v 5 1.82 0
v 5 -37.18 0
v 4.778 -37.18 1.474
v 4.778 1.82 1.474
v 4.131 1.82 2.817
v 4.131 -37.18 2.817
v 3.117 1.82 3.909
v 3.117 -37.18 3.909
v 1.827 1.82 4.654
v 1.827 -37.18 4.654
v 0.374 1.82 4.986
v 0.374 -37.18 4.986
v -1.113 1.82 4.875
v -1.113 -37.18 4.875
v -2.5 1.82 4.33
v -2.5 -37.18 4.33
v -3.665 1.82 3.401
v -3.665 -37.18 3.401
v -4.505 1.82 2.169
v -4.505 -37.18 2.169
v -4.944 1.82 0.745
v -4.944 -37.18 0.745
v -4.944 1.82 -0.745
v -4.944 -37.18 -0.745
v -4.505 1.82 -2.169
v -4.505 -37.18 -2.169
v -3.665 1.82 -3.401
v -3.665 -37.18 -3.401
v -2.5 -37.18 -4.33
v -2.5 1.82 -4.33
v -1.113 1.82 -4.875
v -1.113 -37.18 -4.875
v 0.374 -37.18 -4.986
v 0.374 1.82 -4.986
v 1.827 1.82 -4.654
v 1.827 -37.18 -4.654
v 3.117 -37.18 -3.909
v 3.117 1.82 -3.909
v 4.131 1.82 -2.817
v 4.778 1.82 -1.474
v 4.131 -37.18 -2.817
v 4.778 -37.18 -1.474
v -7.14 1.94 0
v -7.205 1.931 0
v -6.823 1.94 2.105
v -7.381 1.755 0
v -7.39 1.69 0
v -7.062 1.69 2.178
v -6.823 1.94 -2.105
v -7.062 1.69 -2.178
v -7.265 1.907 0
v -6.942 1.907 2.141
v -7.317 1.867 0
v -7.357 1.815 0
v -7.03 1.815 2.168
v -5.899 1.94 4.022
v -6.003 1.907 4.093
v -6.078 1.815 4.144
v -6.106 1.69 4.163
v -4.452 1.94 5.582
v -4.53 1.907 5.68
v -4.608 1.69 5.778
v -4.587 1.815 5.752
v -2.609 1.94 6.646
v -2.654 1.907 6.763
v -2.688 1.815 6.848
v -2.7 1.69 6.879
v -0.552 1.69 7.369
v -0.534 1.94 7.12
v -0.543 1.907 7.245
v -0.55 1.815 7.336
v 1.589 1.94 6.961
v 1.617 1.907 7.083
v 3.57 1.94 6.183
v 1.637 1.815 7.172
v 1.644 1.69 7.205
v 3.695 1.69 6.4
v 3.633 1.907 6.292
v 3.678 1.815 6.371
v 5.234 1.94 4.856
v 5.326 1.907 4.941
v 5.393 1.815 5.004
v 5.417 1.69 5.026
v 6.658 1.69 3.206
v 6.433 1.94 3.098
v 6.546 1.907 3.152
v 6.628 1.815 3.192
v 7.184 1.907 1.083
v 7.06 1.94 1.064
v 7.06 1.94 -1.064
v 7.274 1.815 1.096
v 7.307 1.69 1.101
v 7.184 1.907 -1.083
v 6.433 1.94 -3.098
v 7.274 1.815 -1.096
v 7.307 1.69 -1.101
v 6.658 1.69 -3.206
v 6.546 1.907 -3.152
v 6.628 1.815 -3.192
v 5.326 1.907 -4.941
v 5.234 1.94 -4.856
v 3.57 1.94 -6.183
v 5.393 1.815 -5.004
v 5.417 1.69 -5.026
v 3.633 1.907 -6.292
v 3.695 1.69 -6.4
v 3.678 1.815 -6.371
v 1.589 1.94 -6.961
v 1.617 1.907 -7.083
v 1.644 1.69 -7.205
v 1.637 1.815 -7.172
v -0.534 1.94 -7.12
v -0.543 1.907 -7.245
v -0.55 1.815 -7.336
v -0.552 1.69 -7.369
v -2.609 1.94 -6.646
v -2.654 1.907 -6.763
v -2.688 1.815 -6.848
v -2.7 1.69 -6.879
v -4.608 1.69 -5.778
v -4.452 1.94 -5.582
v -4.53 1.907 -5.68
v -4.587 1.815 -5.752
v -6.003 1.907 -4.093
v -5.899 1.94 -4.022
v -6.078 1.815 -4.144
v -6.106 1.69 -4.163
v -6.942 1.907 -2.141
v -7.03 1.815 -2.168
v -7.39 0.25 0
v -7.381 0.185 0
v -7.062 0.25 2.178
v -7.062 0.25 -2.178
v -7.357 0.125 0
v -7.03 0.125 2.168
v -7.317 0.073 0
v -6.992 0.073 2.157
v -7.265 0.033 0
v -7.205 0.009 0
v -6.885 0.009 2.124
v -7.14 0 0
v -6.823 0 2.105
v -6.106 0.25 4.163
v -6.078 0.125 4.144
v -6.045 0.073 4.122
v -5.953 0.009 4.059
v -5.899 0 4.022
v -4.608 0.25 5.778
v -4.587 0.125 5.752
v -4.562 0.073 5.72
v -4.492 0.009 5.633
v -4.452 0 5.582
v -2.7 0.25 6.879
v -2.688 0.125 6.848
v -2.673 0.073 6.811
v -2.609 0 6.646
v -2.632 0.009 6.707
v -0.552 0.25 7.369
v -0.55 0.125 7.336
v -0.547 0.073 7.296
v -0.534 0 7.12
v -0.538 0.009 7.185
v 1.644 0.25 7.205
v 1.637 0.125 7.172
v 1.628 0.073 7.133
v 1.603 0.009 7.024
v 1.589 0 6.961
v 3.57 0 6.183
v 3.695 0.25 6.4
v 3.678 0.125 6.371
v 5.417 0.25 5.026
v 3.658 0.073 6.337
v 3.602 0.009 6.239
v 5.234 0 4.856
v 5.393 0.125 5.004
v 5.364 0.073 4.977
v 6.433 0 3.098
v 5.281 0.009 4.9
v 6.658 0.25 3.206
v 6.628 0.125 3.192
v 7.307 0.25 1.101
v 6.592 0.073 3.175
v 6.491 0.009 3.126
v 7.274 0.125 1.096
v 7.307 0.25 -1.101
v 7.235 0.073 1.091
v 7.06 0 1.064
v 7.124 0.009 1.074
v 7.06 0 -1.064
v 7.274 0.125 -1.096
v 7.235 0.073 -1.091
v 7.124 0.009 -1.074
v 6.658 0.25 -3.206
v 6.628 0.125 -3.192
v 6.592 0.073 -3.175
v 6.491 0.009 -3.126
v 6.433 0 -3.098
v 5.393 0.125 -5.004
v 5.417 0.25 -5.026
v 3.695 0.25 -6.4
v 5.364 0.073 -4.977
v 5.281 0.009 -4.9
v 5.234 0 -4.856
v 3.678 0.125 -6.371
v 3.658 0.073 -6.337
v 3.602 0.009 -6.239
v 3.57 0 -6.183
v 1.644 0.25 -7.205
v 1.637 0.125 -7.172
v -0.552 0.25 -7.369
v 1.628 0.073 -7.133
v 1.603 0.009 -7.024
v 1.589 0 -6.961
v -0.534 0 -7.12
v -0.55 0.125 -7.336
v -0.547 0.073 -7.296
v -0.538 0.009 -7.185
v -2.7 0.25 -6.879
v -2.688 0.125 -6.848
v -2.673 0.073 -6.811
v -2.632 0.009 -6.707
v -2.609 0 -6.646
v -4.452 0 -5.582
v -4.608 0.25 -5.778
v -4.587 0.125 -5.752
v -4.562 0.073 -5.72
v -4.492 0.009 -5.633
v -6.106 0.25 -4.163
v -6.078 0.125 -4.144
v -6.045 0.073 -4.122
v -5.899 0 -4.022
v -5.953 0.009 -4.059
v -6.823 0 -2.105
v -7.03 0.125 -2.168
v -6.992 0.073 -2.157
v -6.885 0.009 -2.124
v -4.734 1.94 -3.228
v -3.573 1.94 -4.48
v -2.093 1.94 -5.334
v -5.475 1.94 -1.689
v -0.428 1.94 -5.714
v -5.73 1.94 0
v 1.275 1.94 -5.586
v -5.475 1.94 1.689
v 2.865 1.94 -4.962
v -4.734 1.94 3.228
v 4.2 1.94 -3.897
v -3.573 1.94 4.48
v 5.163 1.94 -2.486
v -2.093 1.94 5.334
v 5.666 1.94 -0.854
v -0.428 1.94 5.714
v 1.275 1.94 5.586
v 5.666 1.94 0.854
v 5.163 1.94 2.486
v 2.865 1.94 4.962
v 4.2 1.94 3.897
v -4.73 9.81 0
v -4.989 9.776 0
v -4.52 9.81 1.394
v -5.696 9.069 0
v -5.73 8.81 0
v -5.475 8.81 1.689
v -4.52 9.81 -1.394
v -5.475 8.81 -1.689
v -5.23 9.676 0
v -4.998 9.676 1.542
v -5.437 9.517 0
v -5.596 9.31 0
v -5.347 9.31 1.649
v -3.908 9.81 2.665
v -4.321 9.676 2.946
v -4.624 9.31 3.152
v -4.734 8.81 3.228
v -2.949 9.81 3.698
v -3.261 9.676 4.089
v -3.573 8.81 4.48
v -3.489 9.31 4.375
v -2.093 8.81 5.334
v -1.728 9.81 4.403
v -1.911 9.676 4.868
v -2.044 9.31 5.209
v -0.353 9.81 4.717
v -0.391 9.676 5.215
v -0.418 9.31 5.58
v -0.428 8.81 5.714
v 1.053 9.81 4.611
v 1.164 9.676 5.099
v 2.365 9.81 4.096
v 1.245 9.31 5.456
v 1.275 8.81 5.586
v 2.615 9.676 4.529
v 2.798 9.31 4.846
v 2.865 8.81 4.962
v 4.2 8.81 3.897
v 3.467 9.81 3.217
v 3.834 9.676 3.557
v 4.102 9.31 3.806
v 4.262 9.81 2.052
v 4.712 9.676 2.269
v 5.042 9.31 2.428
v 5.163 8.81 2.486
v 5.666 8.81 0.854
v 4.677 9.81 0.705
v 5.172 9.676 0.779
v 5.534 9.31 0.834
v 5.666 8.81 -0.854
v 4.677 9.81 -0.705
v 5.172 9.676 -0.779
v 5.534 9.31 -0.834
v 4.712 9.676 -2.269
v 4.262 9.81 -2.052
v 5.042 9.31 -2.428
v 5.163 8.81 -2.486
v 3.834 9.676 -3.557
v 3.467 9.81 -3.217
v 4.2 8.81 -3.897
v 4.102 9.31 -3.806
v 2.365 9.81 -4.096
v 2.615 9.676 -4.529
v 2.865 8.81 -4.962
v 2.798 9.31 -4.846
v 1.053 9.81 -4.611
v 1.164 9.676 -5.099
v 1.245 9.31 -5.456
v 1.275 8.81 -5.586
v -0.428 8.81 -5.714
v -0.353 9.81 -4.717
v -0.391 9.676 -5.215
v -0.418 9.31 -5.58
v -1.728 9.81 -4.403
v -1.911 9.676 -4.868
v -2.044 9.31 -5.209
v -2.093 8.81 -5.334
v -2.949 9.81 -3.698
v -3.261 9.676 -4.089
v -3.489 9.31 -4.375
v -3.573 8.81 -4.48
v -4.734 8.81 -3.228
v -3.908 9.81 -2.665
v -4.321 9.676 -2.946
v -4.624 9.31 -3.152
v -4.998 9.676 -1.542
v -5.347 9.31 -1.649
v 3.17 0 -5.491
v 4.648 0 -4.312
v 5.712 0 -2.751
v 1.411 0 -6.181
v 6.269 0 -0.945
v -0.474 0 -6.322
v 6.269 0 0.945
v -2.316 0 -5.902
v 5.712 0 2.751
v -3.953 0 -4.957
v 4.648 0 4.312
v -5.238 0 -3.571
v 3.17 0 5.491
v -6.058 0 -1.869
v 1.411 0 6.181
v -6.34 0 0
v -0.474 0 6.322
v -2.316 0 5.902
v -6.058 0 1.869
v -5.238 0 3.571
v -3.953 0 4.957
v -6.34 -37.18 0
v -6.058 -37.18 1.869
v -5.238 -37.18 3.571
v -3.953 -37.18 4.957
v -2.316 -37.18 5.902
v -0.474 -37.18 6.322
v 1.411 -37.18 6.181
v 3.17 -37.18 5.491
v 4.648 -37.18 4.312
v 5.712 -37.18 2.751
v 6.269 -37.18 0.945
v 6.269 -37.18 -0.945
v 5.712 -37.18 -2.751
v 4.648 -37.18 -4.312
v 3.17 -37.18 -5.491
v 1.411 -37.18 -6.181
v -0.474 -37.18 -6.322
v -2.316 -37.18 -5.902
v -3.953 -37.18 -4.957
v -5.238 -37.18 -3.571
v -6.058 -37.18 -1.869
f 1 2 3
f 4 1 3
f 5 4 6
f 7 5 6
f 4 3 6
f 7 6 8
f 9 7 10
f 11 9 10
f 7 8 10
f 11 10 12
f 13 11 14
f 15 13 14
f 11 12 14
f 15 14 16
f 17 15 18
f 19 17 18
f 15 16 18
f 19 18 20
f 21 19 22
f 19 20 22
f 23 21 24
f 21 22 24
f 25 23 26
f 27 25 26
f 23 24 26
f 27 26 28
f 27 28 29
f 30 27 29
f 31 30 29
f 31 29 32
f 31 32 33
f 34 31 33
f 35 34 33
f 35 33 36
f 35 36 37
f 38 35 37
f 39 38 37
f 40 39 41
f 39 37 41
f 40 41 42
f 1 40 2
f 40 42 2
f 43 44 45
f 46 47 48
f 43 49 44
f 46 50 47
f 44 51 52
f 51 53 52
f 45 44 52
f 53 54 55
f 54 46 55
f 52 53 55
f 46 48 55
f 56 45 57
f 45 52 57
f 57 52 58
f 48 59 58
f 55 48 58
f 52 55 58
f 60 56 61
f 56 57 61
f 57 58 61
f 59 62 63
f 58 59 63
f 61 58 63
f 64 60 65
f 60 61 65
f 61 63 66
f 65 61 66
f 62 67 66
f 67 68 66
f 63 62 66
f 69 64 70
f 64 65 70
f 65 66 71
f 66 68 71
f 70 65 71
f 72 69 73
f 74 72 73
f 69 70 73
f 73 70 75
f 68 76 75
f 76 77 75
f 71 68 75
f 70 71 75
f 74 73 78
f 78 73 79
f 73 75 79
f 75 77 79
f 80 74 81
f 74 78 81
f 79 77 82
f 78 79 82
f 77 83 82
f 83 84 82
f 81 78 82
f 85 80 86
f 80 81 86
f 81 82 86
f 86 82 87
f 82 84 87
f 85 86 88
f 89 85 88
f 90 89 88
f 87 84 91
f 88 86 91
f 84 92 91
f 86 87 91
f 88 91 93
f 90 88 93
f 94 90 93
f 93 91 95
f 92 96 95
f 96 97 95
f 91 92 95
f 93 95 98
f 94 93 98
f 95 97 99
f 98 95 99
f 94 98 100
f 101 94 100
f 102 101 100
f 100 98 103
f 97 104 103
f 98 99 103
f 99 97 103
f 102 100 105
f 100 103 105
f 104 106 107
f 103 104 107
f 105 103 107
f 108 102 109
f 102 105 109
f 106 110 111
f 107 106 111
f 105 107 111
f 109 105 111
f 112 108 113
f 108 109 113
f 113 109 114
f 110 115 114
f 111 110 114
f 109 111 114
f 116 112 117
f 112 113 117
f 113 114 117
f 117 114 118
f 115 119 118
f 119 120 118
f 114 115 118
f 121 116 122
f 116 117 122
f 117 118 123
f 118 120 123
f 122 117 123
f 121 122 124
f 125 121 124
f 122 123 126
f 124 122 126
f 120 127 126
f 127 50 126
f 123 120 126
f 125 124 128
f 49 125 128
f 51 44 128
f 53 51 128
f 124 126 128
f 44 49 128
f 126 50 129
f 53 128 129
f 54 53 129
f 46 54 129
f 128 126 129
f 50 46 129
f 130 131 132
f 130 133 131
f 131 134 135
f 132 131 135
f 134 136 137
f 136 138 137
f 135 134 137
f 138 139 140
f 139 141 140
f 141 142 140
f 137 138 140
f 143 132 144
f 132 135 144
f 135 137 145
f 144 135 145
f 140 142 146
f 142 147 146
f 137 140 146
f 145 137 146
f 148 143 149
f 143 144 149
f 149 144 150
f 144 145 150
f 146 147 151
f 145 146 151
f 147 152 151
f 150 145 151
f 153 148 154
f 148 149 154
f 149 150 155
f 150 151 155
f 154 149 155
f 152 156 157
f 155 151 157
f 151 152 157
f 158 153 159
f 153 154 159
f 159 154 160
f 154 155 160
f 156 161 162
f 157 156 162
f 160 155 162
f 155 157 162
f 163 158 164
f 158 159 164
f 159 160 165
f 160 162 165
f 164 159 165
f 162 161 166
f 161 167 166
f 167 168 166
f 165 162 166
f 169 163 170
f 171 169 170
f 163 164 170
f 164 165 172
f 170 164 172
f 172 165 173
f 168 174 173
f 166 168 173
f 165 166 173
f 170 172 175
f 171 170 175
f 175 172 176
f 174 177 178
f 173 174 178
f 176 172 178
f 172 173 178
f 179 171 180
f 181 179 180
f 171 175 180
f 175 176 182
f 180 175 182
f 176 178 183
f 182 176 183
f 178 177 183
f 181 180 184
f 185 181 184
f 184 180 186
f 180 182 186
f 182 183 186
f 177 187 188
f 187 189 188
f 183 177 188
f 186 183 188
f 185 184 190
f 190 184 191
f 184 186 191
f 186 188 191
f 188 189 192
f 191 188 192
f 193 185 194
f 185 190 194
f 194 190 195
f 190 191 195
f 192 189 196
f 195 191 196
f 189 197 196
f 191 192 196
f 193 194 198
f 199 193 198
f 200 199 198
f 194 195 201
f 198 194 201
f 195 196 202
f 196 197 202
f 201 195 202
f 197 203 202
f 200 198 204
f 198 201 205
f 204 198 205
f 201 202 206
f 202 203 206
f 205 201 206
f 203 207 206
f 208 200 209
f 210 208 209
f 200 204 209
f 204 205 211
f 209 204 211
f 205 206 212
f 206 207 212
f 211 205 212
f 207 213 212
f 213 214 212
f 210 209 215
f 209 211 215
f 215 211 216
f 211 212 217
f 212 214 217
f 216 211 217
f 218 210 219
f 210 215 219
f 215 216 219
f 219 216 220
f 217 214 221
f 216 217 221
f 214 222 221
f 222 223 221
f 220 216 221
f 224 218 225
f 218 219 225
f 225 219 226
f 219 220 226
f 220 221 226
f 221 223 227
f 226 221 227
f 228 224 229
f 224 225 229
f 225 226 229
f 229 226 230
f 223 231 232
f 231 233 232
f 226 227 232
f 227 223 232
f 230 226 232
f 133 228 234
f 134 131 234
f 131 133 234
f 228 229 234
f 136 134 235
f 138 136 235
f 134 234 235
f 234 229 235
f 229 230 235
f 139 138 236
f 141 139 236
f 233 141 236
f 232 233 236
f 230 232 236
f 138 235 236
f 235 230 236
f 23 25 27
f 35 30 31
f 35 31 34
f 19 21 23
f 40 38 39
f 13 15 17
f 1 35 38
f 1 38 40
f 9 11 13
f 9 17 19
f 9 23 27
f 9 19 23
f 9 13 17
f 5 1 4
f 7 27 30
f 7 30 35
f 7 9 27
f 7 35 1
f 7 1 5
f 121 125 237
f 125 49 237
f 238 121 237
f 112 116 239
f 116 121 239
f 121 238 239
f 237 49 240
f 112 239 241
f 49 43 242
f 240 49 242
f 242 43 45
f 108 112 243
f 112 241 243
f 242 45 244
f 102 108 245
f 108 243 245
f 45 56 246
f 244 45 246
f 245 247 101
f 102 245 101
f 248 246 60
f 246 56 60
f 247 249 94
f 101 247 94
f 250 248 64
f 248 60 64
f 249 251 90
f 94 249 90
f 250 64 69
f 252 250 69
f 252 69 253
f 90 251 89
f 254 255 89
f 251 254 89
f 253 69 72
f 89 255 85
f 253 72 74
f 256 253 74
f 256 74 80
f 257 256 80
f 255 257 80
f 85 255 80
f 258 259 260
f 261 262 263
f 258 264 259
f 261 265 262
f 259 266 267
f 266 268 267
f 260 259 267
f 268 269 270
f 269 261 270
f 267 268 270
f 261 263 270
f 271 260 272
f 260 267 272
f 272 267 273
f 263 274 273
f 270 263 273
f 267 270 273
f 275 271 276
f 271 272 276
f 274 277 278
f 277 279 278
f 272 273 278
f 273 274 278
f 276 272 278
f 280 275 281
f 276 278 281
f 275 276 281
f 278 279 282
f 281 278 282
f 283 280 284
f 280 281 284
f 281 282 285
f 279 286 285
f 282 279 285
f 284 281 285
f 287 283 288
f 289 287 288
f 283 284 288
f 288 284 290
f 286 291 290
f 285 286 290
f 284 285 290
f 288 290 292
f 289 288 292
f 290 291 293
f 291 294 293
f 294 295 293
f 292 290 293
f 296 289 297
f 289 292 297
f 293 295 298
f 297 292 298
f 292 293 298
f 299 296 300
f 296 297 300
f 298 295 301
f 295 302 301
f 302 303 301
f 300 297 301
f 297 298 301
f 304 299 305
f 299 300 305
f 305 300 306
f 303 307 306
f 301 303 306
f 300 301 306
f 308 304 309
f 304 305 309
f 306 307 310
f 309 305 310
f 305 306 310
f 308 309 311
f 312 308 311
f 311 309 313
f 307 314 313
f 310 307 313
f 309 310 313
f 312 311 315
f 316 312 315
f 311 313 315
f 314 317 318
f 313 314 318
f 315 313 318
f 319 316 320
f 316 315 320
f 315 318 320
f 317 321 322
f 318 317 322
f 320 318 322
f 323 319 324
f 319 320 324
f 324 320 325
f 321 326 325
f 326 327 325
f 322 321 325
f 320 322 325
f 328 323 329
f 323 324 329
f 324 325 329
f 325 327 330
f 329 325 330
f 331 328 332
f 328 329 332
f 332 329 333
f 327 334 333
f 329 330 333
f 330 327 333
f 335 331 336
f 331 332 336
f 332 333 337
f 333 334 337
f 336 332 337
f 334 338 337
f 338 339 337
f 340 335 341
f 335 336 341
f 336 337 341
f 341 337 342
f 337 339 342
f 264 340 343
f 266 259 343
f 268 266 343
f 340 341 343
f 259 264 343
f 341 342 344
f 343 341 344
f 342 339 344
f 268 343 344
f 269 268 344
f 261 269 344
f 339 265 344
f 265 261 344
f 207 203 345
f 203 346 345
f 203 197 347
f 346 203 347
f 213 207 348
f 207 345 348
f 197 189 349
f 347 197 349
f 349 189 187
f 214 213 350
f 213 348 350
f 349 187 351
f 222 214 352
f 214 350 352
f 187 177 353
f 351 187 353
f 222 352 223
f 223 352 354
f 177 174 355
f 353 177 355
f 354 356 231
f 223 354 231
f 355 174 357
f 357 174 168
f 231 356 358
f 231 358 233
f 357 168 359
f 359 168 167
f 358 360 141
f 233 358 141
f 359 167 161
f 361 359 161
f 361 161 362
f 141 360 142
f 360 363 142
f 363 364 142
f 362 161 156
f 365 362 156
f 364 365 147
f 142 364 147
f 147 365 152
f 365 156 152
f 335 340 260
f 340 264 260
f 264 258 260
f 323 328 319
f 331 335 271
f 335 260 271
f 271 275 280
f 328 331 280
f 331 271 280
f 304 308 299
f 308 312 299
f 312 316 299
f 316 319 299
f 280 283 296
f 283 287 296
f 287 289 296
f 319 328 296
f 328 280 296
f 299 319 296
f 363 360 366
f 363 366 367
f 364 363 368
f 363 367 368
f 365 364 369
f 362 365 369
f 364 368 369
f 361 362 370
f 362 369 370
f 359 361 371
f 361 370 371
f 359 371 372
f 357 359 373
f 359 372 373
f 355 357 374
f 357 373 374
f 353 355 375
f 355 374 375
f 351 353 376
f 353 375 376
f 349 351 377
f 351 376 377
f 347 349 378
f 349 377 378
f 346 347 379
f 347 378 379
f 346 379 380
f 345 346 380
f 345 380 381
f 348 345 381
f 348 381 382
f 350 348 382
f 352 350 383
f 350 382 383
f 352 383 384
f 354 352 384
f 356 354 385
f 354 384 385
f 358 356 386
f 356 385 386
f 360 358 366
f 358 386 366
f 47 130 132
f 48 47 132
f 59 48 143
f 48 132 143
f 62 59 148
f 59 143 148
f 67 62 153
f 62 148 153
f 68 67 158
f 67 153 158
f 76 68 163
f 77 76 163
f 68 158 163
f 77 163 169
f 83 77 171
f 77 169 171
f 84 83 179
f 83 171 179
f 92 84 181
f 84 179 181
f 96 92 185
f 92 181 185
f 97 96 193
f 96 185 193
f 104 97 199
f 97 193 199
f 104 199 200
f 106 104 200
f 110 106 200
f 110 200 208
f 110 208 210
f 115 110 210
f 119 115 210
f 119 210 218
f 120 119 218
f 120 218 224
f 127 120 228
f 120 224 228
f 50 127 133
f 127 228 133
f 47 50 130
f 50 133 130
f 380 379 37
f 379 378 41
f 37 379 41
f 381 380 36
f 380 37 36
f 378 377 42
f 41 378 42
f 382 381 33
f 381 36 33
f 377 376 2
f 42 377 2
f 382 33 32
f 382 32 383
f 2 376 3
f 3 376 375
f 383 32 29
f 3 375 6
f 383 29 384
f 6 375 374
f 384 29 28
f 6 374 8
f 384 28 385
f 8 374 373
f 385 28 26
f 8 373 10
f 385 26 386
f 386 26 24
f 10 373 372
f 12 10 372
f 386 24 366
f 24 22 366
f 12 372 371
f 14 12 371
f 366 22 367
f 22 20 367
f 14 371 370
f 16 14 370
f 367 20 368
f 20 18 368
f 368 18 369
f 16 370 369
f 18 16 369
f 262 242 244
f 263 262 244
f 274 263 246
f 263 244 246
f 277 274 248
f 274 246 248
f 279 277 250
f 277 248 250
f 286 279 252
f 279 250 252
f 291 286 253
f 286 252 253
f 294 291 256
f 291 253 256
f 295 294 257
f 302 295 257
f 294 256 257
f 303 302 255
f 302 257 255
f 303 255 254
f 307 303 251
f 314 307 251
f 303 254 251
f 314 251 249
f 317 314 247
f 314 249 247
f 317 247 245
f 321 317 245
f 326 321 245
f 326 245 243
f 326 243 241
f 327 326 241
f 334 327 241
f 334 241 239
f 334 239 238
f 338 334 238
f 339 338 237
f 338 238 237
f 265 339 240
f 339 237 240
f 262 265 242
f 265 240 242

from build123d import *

# Parameters (mm, degrees)
F2_R     = 1
F3_R     = 0.25
F4_R     = 5
F5_DEPTH = 39


with BuildPart() as f1:
    # F0 (on Top) → F1 (revolve)
    with BuildSketch(Plane.XY):
        Polygon((-6.34, -37.18), (0, -37.18), (0, 9.81), (-5.73, 9.81), (-5.73, 1.94), (-7.39, 1.94), (-7.39, 0), (-6.34, 0), align=None)
    revolve(axis=Axis((0, -13.32371, 0), (0, 1, 0)))

    # F2
    f2_edges = [f1.edges().sort_by_distance(p)[0] for p in [
        (5.73, 9.81, 0),
    ]]
    fillet(f2_edges, radius=F2_R)

    # F3
    f3_edges = [f1.edges().sort_by_distance(p)[0] for p in [
        (7.39, 1.94, 0),
        (7.39, 0, 0),
        (-7.39, 0.97, 0),
    ]]
    fillet(f3_edges, radius=F3_R)

    # F4 (on face) → F5 (cut)
    with BuildSketch(Plane.XZ.offset(37.18)):
        Circle(F4_R)
    extrude(amount=-F5_DEPTH, mode=Mode.SUBTRACT)


solid = f1.part
